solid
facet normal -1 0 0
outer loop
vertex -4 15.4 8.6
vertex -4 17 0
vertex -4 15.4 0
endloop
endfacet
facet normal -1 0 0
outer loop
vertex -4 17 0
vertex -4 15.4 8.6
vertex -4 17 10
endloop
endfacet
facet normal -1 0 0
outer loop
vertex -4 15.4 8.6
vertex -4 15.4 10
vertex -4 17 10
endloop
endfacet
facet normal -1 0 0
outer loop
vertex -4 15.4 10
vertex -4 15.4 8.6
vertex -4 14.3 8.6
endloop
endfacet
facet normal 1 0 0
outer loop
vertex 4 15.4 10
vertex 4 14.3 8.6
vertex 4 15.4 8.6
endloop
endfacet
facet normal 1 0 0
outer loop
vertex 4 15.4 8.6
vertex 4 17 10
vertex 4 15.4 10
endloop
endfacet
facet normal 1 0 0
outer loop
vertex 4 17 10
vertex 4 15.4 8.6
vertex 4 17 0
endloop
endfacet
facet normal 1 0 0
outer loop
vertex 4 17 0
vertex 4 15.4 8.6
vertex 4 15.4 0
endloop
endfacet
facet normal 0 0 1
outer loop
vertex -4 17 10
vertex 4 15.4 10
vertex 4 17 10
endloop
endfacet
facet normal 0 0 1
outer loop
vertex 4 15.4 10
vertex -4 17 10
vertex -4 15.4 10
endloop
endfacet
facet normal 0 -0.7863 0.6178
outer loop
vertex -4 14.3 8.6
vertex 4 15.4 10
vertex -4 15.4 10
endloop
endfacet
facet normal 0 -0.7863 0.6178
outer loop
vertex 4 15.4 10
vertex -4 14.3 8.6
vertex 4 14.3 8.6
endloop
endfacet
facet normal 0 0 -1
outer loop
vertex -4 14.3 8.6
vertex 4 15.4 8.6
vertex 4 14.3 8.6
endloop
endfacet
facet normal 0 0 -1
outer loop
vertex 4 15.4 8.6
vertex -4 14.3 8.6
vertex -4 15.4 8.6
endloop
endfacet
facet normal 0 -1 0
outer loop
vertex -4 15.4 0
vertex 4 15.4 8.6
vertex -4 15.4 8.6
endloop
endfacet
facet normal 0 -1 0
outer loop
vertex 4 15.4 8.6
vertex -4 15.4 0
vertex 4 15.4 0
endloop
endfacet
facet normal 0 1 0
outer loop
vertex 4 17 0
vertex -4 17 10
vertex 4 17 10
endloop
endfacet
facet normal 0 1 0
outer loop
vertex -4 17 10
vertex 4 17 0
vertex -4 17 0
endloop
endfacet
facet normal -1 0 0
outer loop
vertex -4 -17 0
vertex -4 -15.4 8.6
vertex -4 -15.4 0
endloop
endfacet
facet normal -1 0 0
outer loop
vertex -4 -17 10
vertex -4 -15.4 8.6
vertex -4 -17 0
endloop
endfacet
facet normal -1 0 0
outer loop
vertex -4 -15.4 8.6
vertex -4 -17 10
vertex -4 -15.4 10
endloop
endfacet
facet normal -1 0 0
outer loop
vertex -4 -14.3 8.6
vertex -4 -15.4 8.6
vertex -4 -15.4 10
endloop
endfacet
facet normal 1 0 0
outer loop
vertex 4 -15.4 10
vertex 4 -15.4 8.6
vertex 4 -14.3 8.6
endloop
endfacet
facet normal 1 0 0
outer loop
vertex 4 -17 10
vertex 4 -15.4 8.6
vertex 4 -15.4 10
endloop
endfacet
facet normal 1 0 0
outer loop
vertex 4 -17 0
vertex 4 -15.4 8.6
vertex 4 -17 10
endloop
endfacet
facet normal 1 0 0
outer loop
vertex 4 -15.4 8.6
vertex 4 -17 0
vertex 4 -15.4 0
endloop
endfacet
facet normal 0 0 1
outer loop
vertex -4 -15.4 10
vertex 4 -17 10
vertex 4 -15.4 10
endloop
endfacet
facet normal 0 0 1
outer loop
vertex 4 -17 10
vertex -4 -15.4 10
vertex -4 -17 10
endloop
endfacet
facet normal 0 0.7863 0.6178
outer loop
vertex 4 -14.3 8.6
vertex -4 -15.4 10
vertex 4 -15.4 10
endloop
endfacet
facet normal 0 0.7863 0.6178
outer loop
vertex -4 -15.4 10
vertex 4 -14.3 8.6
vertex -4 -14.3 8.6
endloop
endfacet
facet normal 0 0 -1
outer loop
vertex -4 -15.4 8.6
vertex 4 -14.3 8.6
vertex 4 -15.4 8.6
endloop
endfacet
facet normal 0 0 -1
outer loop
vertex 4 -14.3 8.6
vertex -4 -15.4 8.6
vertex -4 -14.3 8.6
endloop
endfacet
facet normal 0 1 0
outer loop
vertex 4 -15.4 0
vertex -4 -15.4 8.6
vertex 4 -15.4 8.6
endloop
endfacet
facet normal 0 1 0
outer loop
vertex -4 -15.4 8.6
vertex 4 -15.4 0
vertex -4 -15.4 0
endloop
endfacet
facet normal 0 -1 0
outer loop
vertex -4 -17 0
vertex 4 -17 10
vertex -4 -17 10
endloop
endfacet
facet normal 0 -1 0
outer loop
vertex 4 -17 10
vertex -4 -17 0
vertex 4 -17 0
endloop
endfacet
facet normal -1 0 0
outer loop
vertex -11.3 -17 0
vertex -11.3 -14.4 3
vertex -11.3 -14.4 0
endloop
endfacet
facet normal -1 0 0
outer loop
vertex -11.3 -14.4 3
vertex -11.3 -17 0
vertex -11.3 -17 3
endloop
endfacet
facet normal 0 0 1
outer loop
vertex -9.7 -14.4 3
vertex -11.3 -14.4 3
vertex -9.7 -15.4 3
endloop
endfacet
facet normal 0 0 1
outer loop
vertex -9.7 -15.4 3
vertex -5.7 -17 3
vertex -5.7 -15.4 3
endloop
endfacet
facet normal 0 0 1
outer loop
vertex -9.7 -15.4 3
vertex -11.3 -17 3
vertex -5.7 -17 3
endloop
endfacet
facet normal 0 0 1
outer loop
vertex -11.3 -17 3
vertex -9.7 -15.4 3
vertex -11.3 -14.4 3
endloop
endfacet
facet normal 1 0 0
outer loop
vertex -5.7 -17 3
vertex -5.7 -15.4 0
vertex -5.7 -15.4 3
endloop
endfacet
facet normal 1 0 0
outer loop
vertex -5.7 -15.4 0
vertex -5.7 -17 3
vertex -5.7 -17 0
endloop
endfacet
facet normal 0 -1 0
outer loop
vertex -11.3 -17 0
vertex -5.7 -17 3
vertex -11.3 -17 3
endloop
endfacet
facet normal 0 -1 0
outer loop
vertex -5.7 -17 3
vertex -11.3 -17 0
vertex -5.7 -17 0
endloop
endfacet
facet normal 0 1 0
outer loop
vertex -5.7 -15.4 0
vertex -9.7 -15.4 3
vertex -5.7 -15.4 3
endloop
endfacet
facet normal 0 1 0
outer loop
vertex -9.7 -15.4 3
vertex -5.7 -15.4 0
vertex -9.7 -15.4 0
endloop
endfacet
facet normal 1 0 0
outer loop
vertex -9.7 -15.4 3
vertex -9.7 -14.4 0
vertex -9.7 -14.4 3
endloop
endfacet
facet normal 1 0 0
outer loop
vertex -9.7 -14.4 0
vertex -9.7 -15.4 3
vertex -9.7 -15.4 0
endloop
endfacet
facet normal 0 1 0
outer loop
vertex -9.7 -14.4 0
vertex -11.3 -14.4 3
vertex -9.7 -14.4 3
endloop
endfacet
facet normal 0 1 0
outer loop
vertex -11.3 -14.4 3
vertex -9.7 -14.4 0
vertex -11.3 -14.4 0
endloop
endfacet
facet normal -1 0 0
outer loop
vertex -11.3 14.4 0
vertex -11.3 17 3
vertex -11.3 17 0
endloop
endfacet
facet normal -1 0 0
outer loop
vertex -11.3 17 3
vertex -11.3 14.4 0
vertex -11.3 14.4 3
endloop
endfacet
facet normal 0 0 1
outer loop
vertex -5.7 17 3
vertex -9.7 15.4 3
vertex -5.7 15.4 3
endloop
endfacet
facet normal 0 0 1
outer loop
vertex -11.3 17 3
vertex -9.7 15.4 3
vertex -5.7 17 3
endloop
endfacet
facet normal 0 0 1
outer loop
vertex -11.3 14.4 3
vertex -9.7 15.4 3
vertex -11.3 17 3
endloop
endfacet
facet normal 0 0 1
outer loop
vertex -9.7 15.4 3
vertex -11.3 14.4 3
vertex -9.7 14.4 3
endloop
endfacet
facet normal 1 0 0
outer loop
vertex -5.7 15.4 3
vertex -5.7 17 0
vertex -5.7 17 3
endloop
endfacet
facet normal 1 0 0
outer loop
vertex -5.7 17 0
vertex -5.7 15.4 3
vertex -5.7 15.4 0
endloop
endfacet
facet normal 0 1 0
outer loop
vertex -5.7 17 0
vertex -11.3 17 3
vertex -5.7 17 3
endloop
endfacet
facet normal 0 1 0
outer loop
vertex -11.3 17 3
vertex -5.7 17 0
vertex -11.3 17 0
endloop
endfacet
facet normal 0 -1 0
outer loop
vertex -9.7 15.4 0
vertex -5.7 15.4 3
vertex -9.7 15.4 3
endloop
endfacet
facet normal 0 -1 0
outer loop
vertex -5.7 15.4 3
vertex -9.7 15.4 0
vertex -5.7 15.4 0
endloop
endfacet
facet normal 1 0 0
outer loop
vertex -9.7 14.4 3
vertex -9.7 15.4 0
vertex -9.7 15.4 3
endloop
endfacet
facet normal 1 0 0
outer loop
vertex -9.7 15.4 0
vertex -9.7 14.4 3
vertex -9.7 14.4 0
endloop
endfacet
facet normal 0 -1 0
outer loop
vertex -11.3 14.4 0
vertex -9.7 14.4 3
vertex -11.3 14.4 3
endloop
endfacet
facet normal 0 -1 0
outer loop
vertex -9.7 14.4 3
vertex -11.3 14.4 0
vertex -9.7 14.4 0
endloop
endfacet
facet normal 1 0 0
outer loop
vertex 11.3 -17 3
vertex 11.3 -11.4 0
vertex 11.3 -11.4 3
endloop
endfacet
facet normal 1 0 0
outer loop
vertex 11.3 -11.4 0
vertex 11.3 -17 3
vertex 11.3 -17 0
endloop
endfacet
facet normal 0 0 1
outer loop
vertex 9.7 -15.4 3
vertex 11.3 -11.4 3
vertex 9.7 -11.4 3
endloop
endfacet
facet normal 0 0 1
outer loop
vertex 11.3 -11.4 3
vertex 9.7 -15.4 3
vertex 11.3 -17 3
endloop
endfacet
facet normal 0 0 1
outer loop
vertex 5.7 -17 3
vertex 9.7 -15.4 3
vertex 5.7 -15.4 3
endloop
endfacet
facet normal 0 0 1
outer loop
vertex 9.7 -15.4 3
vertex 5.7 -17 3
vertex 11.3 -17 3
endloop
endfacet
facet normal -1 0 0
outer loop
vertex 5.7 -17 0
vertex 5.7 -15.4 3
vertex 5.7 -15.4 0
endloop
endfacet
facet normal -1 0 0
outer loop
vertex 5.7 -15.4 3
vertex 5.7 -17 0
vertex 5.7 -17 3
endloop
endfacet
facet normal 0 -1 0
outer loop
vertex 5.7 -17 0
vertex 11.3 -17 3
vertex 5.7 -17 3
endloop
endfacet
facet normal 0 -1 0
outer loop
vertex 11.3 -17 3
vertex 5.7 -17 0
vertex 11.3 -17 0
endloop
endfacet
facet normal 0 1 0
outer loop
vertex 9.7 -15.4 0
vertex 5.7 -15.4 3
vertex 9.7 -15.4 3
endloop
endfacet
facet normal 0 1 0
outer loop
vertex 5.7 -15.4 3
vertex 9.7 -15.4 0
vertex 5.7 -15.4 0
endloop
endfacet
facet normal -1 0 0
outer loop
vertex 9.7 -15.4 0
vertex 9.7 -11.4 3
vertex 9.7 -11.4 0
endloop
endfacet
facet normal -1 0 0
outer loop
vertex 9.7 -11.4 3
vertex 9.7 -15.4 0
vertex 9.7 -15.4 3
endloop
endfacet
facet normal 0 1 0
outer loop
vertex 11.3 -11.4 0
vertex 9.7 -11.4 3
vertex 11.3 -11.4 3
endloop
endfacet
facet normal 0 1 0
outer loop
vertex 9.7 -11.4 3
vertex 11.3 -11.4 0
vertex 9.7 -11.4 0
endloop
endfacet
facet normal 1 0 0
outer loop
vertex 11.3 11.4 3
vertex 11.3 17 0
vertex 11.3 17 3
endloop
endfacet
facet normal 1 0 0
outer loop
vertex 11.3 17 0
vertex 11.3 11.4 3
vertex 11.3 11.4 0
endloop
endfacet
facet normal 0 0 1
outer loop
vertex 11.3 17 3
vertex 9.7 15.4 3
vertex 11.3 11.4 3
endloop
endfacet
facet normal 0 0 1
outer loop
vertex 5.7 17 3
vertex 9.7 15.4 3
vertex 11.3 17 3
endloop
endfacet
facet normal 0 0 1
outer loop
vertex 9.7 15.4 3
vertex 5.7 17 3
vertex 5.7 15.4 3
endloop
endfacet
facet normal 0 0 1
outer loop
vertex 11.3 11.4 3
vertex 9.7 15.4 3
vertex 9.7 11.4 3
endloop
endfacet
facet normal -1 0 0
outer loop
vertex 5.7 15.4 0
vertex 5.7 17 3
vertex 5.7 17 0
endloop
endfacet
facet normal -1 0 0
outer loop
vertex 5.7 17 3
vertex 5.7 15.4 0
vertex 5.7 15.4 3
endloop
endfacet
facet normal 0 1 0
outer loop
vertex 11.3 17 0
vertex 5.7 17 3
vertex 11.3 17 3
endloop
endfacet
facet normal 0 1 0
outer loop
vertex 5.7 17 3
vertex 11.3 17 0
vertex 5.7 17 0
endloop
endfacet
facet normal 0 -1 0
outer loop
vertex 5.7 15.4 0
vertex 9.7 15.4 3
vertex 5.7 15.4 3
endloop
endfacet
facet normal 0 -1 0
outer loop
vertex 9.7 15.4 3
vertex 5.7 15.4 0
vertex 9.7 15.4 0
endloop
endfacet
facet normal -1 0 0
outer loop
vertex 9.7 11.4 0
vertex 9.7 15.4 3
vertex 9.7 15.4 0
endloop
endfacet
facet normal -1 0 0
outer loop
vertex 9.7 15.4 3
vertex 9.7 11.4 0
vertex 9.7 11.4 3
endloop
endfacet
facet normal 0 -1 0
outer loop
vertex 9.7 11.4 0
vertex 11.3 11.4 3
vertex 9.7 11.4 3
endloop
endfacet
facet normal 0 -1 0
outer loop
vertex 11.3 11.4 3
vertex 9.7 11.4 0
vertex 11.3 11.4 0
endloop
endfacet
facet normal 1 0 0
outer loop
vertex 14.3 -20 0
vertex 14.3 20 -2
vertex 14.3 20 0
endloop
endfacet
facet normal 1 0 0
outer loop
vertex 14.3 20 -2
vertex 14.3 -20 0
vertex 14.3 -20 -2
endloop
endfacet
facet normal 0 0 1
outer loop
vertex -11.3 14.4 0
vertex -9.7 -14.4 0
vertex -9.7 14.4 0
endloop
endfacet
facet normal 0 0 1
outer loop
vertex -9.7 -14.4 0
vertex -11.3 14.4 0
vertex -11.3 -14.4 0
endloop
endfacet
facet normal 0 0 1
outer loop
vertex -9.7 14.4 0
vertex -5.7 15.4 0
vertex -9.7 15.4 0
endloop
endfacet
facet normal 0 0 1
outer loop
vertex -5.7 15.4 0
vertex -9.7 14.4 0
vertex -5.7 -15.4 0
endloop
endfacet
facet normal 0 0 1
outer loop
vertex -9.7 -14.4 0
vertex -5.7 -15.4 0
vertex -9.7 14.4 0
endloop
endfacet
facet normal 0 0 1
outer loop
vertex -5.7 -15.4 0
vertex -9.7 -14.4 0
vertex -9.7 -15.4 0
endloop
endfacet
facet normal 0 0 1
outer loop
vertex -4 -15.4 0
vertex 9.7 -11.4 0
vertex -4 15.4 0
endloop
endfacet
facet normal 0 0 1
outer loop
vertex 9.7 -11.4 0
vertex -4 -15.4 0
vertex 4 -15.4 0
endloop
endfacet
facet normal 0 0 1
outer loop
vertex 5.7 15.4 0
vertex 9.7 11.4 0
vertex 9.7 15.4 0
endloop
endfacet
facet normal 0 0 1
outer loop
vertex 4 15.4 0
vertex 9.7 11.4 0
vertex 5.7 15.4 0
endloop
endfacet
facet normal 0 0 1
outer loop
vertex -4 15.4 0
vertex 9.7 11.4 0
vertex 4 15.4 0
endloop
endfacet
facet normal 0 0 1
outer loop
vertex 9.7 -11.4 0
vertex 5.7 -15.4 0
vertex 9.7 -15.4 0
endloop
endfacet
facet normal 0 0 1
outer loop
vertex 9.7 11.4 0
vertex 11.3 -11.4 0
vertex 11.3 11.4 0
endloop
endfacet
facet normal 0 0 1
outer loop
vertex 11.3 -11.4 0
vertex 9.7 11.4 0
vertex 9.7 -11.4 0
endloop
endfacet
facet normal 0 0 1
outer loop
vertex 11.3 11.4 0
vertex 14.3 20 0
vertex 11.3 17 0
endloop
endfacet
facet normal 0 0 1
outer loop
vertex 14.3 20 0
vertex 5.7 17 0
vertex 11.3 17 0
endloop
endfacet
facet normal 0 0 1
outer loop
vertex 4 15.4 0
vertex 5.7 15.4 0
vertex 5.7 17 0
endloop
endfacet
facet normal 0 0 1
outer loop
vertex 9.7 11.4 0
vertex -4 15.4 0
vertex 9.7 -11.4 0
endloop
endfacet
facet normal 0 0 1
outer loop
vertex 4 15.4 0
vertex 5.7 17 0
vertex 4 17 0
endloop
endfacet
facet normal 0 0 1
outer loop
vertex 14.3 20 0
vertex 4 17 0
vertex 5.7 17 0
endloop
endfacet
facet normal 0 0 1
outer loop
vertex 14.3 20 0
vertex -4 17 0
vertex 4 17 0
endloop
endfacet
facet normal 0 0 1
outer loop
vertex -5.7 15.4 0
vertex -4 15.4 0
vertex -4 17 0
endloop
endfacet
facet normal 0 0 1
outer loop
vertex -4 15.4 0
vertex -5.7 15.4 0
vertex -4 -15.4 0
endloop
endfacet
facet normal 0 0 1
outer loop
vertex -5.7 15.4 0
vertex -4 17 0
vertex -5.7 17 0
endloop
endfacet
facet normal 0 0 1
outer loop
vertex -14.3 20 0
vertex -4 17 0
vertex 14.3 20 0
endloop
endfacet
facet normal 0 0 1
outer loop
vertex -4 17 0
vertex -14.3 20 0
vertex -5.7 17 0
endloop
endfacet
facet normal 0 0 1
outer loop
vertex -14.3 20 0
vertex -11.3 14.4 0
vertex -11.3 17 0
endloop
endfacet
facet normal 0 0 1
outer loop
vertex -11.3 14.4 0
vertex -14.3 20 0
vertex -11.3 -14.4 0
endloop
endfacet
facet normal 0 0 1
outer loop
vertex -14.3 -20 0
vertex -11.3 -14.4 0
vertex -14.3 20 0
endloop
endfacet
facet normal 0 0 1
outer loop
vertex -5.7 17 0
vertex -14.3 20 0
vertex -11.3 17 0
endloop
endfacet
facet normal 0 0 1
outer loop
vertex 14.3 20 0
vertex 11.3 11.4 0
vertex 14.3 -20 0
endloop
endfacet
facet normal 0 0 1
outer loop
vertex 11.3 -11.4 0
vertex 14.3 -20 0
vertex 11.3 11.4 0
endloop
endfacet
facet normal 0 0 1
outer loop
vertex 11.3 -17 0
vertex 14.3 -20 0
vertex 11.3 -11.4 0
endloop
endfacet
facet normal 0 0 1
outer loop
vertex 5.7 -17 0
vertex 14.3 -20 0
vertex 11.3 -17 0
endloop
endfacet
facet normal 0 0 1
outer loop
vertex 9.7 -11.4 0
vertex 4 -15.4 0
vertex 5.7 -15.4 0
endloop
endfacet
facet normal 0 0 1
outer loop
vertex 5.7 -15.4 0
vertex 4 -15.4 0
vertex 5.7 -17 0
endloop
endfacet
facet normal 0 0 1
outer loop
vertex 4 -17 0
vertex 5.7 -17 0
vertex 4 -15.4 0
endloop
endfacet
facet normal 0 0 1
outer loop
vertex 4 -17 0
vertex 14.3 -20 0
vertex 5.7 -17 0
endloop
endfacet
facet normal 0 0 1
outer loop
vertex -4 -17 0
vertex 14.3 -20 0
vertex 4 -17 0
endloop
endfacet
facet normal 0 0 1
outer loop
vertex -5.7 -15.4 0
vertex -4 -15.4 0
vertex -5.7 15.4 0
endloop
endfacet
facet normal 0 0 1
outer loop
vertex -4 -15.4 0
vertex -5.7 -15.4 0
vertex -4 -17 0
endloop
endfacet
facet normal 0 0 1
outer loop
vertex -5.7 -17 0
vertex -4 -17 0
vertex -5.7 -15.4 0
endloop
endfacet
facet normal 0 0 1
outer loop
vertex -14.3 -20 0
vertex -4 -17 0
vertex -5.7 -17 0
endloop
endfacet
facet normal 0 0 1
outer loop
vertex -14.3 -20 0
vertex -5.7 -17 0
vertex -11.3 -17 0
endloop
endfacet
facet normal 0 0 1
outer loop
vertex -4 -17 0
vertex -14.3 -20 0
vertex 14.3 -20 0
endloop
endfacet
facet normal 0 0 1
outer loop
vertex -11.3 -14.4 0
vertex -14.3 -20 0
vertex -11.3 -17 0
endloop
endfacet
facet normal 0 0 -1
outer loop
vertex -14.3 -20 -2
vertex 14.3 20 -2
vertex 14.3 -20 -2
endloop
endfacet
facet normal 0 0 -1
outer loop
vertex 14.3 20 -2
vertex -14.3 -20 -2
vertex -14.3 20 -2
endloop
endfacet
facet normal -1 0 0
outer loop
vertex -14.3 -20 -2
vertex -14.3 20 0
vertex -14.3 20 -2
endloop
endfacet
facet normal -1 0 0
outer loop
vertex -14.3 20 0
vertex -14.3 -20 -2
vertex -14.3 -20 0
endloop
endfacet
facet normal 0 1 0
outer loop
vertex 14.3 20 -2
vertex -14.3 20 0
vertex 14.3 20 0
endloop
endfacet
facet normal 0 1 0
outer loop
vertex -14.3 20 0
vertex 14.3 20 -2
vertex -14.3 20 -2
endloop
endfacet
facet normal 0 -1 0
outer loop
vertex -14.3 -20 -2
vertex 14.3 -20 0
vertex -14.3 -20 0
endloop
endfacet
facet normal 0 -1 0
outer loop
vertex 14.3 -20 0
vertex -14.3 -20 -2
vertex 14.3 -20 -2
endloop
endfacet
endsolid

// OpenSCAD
// file: ../wago-221.scad
//-----------------------------------------------------------------------
// WAGO 221 lever connector, held in a snap clip on the floor
//
// Push it down between two arms: the WAGO presses on the sloped lead-ins,
// the arms flex outward, and their hooks snap over its top edge at each
// short end. L-shaped corner stops locate the footprint. The wire-entry face
// is left open, with only a short stub at each corner so the outer ports
// stay clear. Lift the hooks with a fingernail to take it out.
//
// Three modules, all in the same frame:
//   wagoGhost()   the connector, for previews
//   wagoClip()    the plastic: two arms with hooks and four corner stops
//   wagoBody()    the connector as a plain solid (views, collision checks)
//
// Frame: origin on the floor top, at the centre of the WAGO's footprint.
// +X from the wire-entry face to the back (entries face -X), Y along the row
// of levers (the short ends at +-Y), Z up. Units: mm.
//
// Sizes: "221-412", "221-413", "221-415" (4 mm², 2/3/5 way), "221-425" (same
// body as the 415), "221-612", "221-613", "221-615" (6 mm²). Select by name;
// wagoSize(name) gives the row of wagoSizes.
//
// Use with `use <.../components/wago-221/wago-221.scad>`.
//-----------------------------------------------------------------------

//-- [name, length (Y), depth (X), height levers closed, ports, strip length, max mm²]
//-- WAGO data sheets unless noted; see the README for each source
wagoSizes = [
  ["221-412", 13.2, 18.8, 8.6, 2, 11, 4],     // data sheet 03.10.2022 (brochure: 13.1 x 18.6 x 8.3)
  ["221-413", 18.7, 18.6, 8.3, 3, 11, 4],     // WAGO UK brochure, no data sheet found: CAL
  ["221-415", 30.0, 18.6, 8.4, 5, 11, 4],     // data sheet 19.04.2025; measured on a 221-425, controller project
  ["221-425", 30.0, 18.6, 8.4, 5, 11, 4],     // Green Range 415: measured 2026-10 (the controller project's base)
  ["221-612", 16.0, 21.1, 10.1, 2, 13, 6],    // data sheet 12.05.2023 (strip 12-14)
  ["221-613", 22.9, 21.1, 10.1, 3, 13, 6],    // data sheet 04.04.2025
  ["221-615", 36.7, 21.1, 10.1, 5, 13, 6],    // data sheet 07.04.2025
];

function wagoSize(name) = let (i = search([name], wagoSizes)[0])
  assert(i != [] && i != undef, str("unknown WAGO ", name)) wagoSizes[i];
function wagoLength(name) = wagoSize(name)[1];
function wagoDepth(name)  = wagoSize(name)[2];
function wagoHeight(name) = wagoSize(name)[3];
function wagoPorts(name)  = wagoSize(name)[4];
function wagoStrip(name)  = wagoSize(name)[5];

wagoDefault    = "221-415";

//-- The clip
wagoClearance  = 0.4;     // each end and side, footprint to arm / stop (controller base fitClearance)
wagoHook       = 0.7;     // CAL: how far each hook reaches in over the WAGO's top edge. Set by the fit piece
wagoHookGap    = 0.2;     // WAGO top to the hook's flat underside
wagoLeadIn     = 1.4;     // height of the sloped lead-in above the hook
wagoArmThick   = 1.6;     // PETG arm (controller base); flexes outward by the hook to let the WAGO in
wagoArmWidth   = 8;       // across X, centred on the depth
wagoStopH      = 3;       // corner stops, above the floor
wagoStopLeg    = 4;       // stop legs along the ends and the back
wagoStopWall   = 1.6;
wagoEntryStub  = 1.0;     // stop leg along the entry face: short, clear of the outer port

//-- height of the clip above the floor: room needed under a lid (the levers open to
//-- about 20 above the floor, CAL; you only open them with the WAGO out of the clip)
function wagoClipHeight(name = wagoDefault) = wagoHeight(name) + wagoHookGap + wagoLeadIn;

module wagoBody(name = wagoDefault)
{
  translate([-wagoDepth(name)/2, -wagoLength(name)/2, 0])
    cube([wagoDepth(name), wagoLength(name), wagoHeight(name)]);
}

module wagoGhost(name = wagoDefault)
{
  L = wagoLength(name); D = wagoDepth(name); H = wagoHeight(name); n = wagoPorts(name);
  %color("Orange") difference()
  {
    wagoBody(name);
    //-- a conductor entry per port, on the -X face
    for (i = [0 : n - 1])
      translate([-D/2 - 1, (i - (n - 1)/2)*L/n, H*0.4]) rotate([0, 90, 0]) cylinder(d = L/n*0.55, h = 6, $fn = 16);
  }
}

module wagoClip(name = wagoDefault, clearance = wagoClearance, hook = wagoHook)
{
  L = wagoLength(name); D = wagoDepth(name);
  c = clearance;
  H = wagoHeight(name) + wagoHookGap;           // hook underside
  t = wagoArmThick;
  reach = c + hook;                             // hook tip past the arm's inner face
  leg = min(wagoStopLeg, D/2 - wagoArmWidth/2 - 0.8);   // stays clear of the arm, so it flexes
  assert(leg >= 1.5, "WAGO too shallow for the corner stops beside the arms");

  //-- arms: inner face at L/2 + c, hook toward the WAGO, free from the floor so they flex
  for (m = [0, 1])
    mirror([0, m, 0])
      translate([-wagoArmWidth/2, L/2 + c, -0.01])
        rotate([90, 0, 90]) linear_extrude(wagoArmWidth)
          polygon([[0, 0], [t, 0], [t, H + 0.01 + wagoLeadIn], [0, H + 0.01 + wagoLeadIn],
                   [-reach, H + 0.01], [0, H + 0.01]]);
  //-- corner stops, outside the footprint: a leg along each end, one along the back,
  //-- and a short stub along the entry face
  for (sx = [-1, 1], sy = [-1, 1])
    translate([sx*(D/2 + c), sy*(L/2 + c), -0.01])
      mirror([sx < 0 ? 1 : 0, 0, 0]) mirror([0, sy < 0 ? 1 : 0, 0])
      {
        //-- along the end (Y face): from the corner inward in -X
        translate([-leg, 0, 0]) cube([leg + wagoStopWall, wagoStopWall, wagoStopH + 0.01]);
        //-- along the side (X face): from the corner inward in -Y
        sideLeg = sx < 0 ? wagoEntryStub : leg;
        translate([0, -sideLeg, 0]) cube([wagoStopWall, sideLeg + wagoStopWall, wagoStopH + 0.01]);
      }
}
// main file
// One clip on a piece of floor, for the catalogue.
use <../wago-221.scad>

name = "221-415";
L = wagoLength(name); D = wagoDepth(name);

translate([-D/2 - 5, -L/2 - 5, -2]) cube([D + 10, L + 10, 2]);
wagoClip(name);
